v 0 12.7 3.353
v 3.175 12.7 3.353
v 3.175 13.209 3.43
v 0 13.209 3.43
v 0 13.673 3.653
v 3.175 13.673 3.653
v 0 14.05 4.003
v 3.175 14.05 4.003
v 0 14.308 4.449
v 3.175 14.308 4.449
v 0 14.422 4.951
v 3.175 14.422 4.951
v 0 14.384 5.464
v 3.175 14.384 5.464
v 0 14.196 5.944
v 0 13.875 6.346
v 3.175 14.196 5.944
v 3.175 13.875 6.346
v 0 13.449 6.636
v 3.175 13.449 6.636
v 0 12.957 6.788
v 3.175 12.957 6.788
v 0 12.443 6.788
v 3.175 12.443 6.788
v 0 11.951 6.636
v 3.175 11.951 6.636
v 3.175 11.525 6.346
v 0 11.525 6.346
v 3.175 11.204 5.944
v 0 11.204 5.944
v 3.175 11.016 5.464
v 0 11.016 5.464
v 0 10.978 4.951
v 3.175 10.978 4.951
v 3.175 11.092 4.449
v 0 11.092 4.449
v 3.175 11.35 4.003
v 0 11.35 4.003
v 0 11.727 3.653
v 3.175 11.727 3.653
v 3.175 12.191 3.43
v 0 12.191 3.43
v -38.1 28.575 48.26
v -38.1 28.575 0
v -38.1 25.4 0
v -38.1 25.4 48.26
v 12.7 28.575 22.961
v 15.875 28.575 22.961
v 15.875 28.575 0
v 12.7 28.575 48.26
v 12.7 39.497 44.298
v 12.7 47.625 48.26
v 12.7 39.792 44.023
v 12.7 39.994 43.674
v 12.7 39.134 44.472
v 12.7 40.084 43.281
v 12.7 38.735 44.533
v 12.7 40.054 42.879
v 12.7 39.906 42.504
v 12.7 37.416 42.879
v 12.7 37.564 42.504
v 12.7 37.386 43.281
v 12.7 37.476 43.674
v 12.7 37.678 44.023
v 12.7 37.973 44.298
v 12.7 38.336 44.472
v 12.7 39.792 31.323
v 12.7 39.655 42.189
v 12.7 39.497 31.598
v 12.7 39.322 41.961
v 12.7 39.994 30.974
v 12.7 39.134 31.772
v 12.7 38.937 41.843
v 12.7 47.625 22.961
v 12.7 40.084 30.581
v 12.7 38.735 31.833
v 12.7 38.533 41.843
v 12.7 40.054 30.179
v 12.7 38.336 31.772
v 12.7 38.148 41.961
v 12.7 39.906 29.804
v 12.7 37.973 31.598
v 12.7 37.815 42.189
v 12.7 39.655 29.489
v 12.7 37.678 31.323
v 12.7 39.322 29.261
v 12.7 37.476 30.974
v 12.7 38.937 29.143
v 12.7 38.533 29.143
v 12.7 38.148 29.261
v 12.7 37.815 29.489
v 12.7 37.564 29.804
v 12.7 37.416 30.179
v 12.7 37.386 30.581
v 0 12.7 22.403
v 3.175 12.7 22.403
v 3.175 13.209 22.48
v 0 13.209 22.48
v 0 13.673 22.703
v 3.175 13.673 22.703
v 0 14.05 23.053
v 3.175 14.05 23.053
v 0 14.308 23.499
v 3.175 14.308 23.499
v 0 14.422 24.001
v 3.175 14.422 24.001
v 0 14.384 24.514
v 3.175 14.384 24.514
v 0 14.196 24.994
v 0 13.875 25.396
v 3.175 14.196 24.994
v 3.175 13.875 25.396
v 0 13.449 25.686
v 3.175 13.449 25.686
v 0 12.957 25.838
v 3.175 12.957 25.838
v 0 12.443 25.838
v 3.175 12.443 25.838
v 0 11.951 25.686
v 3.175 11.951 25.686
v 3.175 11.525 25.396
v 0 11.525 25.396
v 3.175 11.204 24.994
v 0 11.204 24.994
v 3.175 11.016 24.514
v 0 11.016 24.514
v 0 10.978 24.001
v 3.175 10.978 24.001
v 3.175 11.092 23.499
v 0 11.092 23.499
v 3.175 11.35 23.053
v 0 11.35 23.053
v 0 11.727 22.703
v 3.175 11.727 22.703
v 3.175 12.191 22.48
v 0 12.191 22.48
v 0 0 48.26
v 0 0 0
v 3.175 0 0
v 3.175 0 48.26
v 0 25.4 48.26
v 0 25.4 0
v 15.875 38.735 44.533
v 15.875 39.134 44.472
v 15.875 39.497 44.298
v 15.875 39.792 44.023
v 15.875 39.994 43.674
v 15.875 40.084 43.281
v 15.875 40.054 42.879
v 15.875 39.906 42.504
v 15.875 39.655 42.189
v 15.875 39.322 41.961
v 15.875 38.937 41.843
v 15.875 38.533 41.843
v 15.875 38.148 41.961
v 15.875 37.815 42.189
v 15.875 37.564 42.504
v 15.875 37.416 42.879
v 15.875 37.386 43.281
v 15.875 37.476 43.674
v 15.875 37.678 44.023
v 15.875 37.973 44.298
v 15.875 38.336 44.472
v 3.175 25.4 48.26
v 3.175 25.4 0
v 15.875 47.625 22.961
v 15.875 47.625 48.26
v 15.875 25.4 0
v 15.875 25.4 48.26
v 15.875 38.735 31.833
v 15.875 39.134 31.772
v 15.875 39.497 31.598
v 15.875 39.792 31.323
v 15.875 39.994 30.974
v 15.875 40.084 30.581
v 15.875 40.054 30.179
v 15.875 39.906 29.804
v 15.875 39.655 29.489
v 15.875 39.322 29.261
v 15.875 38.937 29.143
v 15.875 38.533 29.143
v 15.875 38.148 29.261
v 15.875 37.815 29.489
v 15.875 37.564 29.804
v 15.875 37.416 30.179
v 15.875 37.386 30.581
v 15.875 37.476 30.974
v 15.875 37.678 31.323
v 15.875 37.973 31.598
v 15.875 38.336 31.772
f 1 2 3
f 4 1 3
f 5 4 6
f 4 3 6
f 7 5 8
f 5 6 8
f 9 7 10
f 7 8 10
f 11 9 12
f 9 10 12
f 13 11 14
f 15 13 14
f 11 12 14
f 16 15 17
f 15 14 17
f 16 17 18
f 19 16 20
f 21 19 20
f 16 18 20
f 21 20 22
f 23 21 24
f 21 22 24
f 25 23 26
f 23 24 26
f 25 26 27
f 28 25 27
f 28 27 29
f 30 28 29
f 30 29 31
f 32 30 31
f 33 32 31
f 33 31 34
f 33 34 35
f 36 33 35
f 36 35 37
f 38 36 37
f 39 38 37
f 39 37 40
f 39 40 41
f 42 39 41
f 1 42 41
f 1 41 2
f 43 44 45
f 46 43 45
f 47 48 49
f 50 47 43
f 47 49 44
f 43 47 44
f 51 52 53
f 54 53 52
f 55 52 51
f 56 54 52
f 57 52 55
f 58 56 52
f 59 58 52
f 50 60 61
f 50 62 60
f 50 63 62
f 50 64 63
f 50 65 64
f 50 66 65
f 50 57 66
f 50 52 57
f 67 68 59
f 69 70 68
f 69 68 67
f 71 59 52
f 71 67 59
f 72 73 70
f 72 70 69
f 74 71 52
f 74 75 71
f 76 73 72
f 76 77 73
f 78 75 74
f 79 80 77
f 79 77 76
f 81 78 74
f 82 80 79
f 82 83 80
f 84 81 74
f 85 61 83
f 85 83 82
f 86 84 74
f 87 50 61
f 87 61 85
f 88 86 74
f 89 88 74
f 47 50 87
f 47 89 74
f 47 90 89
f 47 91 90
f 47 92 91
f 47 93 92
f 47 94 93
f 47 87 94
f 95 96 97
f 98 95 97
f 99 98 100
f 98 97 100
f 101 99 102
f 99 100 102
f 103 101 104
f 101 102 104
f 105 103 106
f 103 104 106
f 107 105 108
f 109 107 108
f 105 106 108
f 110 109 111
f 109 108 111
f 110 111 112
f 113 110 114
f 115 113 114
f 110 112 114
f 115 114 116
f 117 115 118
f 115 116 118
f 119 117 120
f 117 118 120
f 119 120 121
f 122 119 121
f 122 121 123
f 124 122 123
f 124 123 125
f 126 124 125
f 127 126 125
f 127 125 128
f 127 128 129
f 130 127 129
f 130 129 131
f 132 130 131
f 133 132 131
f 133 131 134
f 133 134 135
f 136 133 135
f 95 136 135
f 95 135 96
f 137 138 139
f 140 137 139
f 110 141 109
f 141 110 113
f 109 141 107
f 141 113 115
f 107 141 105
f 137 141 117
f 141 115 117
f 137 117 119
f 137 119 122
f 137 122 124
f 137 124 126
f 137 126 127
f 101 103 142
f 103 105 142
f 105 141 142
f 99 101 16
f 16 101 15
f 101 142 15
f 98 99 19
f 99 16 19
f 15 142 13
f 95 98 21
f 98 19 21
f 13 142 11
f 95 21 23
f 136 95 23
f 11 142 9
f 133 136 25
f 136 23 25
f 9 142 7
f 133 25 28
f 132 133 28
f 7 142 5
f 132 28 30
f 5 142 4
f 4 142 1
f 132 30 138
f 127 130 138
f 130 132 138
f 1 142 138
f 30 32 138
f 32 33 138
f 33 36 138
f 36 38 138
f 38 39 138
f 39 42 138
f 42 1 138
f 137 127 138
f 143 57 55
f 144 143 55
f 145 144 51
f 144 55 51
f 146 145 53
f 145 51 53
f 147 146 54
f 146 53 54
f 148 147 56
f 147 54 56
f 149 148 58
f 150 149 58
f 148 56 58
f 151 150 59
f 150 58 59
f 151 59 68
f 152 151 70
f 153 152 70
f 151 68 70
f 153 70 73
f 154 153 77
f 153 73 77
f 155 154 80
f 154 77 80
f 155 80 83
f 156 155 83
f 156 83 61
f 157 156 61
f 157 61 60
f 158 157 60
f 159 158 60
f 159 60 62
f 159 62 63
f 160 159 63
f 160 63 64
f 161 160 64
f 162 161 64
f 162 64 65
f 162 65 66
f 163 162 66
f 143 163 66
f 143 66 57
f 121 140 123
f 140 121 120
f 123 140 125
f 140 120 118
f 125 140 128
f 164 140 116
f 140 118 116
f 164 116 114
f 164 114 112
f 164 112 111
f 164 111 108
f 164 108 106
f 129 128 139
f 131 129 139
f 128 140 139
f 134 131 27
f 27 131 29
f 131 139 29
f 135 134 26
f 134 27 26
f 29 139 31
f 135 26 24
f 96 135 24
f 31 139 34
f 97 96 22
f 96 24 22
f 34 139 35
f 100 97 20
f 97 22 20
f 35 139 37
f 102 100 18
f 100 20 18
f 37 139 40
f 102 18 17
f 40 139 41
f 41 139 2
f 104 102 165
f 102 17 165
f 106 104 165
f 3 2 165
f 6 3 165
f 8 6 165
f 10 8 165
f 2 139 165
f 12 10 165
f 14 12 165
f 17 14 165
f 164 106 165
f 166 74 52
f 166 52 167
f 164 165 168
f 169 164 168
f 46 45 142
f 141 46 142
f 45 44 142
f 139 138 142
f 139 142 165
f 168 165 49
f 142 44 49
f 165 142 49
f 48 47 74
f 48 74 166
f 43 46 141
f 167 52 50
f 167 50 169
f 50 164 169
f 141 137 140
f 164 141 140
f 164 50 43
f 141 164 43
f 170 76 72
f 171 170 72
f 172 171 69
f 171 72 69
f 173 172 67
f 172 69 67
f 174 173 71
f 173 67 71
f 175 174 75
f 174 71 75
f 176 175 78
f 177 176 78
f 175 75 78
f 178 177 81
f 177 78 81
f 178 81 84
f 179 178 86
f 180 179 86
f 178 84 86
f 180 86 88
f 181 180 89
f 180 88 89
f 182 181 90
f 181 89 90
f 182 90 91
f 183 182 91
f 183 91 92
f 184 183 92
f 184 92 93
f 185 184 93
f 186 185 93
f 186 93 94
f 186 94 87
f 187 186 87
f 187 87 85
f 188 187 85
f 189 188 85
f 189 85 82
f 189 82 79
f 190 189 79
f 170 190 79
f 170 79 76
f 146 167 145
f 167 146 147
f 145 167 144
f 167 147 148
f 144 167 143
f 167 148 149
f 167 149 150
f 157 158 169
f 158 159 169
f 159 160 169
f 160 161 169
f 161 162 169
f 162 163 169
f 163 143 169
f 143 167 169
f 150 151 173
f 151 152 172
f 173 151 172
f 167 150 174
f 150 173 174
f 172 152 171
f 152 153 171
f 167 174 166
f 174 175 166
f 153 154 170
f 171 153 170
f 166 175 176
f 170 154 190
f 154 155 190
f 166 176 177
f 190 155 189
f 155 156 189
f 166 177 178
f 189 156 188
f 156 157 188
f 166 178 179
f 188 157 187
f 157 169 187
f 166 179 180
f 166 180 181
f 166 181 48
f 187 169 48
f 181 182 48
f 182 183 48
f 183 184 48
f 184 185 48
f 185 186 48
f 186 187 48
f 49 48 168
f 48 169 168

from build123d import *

# Parameters (mm, degrees)
BOSS_EXTRUDE1_DEPTH       = 48.26
SKETCH2_W                 = 3.175
SKETCH2_H                 = 25.298904356
BOSS_EXTRUDE2_DEPTH       = 19.05
TAP_DRILL_FOR_6_32_TAP1_D = 2.7051
TAP_DRILL_FOR_8_32_TAP1_D = 3.4544


with BuildPart() as part:
    # Sketch1 → Boss-Extrude1 (new body)
    with BuildSketch(Plane.XY):
        Polygon((15.875, 28.575), (-38.1, 28.575), (-38.1, 25.4), (0, 25.4), (0, 0), (3.175, 0), (3.175, 25.4), (15.875, 25.4), align=None)
    extrude(amount=BOSS_EXTRUDE1_DEPTH)

    # Sketch2 → Boss-Extrude2 (add)
    with BuildSketch(Plane(origin=(0, 28.575, 0), x_dir=(1, 0, 0), z_dir=(0, 1, 0))):
        with Locations((14.2875, -35.610547822)):
            Rectangle(SKETCH2_W, SKETCH2_H)
    extrude(amount=BOSS_EXTRUDE2_DEPTH)

    # Tap Drill for #6-32 Tap1 (through all)
    with Locations(Plane(origin=(15.875, 0, 0), x_dir=(0, 0, -1), z_dir=(1, 0, 0))):
        with Locations((-43.18, 38.735), (-30.48, 38.735)):
            Hole(TAP_DRILL_FOR_6_32_TAP1_D / 2)

    # Tap Drill for #8-32 Tap1 (through all)
    with Locations(Plane.ZY):
        with Locations((5.08, 12.7), (24.13, 12.7)):
            Hole(TAP_DRILL_FOR_8_32_TAP1_D / 2)


solid = part.part
